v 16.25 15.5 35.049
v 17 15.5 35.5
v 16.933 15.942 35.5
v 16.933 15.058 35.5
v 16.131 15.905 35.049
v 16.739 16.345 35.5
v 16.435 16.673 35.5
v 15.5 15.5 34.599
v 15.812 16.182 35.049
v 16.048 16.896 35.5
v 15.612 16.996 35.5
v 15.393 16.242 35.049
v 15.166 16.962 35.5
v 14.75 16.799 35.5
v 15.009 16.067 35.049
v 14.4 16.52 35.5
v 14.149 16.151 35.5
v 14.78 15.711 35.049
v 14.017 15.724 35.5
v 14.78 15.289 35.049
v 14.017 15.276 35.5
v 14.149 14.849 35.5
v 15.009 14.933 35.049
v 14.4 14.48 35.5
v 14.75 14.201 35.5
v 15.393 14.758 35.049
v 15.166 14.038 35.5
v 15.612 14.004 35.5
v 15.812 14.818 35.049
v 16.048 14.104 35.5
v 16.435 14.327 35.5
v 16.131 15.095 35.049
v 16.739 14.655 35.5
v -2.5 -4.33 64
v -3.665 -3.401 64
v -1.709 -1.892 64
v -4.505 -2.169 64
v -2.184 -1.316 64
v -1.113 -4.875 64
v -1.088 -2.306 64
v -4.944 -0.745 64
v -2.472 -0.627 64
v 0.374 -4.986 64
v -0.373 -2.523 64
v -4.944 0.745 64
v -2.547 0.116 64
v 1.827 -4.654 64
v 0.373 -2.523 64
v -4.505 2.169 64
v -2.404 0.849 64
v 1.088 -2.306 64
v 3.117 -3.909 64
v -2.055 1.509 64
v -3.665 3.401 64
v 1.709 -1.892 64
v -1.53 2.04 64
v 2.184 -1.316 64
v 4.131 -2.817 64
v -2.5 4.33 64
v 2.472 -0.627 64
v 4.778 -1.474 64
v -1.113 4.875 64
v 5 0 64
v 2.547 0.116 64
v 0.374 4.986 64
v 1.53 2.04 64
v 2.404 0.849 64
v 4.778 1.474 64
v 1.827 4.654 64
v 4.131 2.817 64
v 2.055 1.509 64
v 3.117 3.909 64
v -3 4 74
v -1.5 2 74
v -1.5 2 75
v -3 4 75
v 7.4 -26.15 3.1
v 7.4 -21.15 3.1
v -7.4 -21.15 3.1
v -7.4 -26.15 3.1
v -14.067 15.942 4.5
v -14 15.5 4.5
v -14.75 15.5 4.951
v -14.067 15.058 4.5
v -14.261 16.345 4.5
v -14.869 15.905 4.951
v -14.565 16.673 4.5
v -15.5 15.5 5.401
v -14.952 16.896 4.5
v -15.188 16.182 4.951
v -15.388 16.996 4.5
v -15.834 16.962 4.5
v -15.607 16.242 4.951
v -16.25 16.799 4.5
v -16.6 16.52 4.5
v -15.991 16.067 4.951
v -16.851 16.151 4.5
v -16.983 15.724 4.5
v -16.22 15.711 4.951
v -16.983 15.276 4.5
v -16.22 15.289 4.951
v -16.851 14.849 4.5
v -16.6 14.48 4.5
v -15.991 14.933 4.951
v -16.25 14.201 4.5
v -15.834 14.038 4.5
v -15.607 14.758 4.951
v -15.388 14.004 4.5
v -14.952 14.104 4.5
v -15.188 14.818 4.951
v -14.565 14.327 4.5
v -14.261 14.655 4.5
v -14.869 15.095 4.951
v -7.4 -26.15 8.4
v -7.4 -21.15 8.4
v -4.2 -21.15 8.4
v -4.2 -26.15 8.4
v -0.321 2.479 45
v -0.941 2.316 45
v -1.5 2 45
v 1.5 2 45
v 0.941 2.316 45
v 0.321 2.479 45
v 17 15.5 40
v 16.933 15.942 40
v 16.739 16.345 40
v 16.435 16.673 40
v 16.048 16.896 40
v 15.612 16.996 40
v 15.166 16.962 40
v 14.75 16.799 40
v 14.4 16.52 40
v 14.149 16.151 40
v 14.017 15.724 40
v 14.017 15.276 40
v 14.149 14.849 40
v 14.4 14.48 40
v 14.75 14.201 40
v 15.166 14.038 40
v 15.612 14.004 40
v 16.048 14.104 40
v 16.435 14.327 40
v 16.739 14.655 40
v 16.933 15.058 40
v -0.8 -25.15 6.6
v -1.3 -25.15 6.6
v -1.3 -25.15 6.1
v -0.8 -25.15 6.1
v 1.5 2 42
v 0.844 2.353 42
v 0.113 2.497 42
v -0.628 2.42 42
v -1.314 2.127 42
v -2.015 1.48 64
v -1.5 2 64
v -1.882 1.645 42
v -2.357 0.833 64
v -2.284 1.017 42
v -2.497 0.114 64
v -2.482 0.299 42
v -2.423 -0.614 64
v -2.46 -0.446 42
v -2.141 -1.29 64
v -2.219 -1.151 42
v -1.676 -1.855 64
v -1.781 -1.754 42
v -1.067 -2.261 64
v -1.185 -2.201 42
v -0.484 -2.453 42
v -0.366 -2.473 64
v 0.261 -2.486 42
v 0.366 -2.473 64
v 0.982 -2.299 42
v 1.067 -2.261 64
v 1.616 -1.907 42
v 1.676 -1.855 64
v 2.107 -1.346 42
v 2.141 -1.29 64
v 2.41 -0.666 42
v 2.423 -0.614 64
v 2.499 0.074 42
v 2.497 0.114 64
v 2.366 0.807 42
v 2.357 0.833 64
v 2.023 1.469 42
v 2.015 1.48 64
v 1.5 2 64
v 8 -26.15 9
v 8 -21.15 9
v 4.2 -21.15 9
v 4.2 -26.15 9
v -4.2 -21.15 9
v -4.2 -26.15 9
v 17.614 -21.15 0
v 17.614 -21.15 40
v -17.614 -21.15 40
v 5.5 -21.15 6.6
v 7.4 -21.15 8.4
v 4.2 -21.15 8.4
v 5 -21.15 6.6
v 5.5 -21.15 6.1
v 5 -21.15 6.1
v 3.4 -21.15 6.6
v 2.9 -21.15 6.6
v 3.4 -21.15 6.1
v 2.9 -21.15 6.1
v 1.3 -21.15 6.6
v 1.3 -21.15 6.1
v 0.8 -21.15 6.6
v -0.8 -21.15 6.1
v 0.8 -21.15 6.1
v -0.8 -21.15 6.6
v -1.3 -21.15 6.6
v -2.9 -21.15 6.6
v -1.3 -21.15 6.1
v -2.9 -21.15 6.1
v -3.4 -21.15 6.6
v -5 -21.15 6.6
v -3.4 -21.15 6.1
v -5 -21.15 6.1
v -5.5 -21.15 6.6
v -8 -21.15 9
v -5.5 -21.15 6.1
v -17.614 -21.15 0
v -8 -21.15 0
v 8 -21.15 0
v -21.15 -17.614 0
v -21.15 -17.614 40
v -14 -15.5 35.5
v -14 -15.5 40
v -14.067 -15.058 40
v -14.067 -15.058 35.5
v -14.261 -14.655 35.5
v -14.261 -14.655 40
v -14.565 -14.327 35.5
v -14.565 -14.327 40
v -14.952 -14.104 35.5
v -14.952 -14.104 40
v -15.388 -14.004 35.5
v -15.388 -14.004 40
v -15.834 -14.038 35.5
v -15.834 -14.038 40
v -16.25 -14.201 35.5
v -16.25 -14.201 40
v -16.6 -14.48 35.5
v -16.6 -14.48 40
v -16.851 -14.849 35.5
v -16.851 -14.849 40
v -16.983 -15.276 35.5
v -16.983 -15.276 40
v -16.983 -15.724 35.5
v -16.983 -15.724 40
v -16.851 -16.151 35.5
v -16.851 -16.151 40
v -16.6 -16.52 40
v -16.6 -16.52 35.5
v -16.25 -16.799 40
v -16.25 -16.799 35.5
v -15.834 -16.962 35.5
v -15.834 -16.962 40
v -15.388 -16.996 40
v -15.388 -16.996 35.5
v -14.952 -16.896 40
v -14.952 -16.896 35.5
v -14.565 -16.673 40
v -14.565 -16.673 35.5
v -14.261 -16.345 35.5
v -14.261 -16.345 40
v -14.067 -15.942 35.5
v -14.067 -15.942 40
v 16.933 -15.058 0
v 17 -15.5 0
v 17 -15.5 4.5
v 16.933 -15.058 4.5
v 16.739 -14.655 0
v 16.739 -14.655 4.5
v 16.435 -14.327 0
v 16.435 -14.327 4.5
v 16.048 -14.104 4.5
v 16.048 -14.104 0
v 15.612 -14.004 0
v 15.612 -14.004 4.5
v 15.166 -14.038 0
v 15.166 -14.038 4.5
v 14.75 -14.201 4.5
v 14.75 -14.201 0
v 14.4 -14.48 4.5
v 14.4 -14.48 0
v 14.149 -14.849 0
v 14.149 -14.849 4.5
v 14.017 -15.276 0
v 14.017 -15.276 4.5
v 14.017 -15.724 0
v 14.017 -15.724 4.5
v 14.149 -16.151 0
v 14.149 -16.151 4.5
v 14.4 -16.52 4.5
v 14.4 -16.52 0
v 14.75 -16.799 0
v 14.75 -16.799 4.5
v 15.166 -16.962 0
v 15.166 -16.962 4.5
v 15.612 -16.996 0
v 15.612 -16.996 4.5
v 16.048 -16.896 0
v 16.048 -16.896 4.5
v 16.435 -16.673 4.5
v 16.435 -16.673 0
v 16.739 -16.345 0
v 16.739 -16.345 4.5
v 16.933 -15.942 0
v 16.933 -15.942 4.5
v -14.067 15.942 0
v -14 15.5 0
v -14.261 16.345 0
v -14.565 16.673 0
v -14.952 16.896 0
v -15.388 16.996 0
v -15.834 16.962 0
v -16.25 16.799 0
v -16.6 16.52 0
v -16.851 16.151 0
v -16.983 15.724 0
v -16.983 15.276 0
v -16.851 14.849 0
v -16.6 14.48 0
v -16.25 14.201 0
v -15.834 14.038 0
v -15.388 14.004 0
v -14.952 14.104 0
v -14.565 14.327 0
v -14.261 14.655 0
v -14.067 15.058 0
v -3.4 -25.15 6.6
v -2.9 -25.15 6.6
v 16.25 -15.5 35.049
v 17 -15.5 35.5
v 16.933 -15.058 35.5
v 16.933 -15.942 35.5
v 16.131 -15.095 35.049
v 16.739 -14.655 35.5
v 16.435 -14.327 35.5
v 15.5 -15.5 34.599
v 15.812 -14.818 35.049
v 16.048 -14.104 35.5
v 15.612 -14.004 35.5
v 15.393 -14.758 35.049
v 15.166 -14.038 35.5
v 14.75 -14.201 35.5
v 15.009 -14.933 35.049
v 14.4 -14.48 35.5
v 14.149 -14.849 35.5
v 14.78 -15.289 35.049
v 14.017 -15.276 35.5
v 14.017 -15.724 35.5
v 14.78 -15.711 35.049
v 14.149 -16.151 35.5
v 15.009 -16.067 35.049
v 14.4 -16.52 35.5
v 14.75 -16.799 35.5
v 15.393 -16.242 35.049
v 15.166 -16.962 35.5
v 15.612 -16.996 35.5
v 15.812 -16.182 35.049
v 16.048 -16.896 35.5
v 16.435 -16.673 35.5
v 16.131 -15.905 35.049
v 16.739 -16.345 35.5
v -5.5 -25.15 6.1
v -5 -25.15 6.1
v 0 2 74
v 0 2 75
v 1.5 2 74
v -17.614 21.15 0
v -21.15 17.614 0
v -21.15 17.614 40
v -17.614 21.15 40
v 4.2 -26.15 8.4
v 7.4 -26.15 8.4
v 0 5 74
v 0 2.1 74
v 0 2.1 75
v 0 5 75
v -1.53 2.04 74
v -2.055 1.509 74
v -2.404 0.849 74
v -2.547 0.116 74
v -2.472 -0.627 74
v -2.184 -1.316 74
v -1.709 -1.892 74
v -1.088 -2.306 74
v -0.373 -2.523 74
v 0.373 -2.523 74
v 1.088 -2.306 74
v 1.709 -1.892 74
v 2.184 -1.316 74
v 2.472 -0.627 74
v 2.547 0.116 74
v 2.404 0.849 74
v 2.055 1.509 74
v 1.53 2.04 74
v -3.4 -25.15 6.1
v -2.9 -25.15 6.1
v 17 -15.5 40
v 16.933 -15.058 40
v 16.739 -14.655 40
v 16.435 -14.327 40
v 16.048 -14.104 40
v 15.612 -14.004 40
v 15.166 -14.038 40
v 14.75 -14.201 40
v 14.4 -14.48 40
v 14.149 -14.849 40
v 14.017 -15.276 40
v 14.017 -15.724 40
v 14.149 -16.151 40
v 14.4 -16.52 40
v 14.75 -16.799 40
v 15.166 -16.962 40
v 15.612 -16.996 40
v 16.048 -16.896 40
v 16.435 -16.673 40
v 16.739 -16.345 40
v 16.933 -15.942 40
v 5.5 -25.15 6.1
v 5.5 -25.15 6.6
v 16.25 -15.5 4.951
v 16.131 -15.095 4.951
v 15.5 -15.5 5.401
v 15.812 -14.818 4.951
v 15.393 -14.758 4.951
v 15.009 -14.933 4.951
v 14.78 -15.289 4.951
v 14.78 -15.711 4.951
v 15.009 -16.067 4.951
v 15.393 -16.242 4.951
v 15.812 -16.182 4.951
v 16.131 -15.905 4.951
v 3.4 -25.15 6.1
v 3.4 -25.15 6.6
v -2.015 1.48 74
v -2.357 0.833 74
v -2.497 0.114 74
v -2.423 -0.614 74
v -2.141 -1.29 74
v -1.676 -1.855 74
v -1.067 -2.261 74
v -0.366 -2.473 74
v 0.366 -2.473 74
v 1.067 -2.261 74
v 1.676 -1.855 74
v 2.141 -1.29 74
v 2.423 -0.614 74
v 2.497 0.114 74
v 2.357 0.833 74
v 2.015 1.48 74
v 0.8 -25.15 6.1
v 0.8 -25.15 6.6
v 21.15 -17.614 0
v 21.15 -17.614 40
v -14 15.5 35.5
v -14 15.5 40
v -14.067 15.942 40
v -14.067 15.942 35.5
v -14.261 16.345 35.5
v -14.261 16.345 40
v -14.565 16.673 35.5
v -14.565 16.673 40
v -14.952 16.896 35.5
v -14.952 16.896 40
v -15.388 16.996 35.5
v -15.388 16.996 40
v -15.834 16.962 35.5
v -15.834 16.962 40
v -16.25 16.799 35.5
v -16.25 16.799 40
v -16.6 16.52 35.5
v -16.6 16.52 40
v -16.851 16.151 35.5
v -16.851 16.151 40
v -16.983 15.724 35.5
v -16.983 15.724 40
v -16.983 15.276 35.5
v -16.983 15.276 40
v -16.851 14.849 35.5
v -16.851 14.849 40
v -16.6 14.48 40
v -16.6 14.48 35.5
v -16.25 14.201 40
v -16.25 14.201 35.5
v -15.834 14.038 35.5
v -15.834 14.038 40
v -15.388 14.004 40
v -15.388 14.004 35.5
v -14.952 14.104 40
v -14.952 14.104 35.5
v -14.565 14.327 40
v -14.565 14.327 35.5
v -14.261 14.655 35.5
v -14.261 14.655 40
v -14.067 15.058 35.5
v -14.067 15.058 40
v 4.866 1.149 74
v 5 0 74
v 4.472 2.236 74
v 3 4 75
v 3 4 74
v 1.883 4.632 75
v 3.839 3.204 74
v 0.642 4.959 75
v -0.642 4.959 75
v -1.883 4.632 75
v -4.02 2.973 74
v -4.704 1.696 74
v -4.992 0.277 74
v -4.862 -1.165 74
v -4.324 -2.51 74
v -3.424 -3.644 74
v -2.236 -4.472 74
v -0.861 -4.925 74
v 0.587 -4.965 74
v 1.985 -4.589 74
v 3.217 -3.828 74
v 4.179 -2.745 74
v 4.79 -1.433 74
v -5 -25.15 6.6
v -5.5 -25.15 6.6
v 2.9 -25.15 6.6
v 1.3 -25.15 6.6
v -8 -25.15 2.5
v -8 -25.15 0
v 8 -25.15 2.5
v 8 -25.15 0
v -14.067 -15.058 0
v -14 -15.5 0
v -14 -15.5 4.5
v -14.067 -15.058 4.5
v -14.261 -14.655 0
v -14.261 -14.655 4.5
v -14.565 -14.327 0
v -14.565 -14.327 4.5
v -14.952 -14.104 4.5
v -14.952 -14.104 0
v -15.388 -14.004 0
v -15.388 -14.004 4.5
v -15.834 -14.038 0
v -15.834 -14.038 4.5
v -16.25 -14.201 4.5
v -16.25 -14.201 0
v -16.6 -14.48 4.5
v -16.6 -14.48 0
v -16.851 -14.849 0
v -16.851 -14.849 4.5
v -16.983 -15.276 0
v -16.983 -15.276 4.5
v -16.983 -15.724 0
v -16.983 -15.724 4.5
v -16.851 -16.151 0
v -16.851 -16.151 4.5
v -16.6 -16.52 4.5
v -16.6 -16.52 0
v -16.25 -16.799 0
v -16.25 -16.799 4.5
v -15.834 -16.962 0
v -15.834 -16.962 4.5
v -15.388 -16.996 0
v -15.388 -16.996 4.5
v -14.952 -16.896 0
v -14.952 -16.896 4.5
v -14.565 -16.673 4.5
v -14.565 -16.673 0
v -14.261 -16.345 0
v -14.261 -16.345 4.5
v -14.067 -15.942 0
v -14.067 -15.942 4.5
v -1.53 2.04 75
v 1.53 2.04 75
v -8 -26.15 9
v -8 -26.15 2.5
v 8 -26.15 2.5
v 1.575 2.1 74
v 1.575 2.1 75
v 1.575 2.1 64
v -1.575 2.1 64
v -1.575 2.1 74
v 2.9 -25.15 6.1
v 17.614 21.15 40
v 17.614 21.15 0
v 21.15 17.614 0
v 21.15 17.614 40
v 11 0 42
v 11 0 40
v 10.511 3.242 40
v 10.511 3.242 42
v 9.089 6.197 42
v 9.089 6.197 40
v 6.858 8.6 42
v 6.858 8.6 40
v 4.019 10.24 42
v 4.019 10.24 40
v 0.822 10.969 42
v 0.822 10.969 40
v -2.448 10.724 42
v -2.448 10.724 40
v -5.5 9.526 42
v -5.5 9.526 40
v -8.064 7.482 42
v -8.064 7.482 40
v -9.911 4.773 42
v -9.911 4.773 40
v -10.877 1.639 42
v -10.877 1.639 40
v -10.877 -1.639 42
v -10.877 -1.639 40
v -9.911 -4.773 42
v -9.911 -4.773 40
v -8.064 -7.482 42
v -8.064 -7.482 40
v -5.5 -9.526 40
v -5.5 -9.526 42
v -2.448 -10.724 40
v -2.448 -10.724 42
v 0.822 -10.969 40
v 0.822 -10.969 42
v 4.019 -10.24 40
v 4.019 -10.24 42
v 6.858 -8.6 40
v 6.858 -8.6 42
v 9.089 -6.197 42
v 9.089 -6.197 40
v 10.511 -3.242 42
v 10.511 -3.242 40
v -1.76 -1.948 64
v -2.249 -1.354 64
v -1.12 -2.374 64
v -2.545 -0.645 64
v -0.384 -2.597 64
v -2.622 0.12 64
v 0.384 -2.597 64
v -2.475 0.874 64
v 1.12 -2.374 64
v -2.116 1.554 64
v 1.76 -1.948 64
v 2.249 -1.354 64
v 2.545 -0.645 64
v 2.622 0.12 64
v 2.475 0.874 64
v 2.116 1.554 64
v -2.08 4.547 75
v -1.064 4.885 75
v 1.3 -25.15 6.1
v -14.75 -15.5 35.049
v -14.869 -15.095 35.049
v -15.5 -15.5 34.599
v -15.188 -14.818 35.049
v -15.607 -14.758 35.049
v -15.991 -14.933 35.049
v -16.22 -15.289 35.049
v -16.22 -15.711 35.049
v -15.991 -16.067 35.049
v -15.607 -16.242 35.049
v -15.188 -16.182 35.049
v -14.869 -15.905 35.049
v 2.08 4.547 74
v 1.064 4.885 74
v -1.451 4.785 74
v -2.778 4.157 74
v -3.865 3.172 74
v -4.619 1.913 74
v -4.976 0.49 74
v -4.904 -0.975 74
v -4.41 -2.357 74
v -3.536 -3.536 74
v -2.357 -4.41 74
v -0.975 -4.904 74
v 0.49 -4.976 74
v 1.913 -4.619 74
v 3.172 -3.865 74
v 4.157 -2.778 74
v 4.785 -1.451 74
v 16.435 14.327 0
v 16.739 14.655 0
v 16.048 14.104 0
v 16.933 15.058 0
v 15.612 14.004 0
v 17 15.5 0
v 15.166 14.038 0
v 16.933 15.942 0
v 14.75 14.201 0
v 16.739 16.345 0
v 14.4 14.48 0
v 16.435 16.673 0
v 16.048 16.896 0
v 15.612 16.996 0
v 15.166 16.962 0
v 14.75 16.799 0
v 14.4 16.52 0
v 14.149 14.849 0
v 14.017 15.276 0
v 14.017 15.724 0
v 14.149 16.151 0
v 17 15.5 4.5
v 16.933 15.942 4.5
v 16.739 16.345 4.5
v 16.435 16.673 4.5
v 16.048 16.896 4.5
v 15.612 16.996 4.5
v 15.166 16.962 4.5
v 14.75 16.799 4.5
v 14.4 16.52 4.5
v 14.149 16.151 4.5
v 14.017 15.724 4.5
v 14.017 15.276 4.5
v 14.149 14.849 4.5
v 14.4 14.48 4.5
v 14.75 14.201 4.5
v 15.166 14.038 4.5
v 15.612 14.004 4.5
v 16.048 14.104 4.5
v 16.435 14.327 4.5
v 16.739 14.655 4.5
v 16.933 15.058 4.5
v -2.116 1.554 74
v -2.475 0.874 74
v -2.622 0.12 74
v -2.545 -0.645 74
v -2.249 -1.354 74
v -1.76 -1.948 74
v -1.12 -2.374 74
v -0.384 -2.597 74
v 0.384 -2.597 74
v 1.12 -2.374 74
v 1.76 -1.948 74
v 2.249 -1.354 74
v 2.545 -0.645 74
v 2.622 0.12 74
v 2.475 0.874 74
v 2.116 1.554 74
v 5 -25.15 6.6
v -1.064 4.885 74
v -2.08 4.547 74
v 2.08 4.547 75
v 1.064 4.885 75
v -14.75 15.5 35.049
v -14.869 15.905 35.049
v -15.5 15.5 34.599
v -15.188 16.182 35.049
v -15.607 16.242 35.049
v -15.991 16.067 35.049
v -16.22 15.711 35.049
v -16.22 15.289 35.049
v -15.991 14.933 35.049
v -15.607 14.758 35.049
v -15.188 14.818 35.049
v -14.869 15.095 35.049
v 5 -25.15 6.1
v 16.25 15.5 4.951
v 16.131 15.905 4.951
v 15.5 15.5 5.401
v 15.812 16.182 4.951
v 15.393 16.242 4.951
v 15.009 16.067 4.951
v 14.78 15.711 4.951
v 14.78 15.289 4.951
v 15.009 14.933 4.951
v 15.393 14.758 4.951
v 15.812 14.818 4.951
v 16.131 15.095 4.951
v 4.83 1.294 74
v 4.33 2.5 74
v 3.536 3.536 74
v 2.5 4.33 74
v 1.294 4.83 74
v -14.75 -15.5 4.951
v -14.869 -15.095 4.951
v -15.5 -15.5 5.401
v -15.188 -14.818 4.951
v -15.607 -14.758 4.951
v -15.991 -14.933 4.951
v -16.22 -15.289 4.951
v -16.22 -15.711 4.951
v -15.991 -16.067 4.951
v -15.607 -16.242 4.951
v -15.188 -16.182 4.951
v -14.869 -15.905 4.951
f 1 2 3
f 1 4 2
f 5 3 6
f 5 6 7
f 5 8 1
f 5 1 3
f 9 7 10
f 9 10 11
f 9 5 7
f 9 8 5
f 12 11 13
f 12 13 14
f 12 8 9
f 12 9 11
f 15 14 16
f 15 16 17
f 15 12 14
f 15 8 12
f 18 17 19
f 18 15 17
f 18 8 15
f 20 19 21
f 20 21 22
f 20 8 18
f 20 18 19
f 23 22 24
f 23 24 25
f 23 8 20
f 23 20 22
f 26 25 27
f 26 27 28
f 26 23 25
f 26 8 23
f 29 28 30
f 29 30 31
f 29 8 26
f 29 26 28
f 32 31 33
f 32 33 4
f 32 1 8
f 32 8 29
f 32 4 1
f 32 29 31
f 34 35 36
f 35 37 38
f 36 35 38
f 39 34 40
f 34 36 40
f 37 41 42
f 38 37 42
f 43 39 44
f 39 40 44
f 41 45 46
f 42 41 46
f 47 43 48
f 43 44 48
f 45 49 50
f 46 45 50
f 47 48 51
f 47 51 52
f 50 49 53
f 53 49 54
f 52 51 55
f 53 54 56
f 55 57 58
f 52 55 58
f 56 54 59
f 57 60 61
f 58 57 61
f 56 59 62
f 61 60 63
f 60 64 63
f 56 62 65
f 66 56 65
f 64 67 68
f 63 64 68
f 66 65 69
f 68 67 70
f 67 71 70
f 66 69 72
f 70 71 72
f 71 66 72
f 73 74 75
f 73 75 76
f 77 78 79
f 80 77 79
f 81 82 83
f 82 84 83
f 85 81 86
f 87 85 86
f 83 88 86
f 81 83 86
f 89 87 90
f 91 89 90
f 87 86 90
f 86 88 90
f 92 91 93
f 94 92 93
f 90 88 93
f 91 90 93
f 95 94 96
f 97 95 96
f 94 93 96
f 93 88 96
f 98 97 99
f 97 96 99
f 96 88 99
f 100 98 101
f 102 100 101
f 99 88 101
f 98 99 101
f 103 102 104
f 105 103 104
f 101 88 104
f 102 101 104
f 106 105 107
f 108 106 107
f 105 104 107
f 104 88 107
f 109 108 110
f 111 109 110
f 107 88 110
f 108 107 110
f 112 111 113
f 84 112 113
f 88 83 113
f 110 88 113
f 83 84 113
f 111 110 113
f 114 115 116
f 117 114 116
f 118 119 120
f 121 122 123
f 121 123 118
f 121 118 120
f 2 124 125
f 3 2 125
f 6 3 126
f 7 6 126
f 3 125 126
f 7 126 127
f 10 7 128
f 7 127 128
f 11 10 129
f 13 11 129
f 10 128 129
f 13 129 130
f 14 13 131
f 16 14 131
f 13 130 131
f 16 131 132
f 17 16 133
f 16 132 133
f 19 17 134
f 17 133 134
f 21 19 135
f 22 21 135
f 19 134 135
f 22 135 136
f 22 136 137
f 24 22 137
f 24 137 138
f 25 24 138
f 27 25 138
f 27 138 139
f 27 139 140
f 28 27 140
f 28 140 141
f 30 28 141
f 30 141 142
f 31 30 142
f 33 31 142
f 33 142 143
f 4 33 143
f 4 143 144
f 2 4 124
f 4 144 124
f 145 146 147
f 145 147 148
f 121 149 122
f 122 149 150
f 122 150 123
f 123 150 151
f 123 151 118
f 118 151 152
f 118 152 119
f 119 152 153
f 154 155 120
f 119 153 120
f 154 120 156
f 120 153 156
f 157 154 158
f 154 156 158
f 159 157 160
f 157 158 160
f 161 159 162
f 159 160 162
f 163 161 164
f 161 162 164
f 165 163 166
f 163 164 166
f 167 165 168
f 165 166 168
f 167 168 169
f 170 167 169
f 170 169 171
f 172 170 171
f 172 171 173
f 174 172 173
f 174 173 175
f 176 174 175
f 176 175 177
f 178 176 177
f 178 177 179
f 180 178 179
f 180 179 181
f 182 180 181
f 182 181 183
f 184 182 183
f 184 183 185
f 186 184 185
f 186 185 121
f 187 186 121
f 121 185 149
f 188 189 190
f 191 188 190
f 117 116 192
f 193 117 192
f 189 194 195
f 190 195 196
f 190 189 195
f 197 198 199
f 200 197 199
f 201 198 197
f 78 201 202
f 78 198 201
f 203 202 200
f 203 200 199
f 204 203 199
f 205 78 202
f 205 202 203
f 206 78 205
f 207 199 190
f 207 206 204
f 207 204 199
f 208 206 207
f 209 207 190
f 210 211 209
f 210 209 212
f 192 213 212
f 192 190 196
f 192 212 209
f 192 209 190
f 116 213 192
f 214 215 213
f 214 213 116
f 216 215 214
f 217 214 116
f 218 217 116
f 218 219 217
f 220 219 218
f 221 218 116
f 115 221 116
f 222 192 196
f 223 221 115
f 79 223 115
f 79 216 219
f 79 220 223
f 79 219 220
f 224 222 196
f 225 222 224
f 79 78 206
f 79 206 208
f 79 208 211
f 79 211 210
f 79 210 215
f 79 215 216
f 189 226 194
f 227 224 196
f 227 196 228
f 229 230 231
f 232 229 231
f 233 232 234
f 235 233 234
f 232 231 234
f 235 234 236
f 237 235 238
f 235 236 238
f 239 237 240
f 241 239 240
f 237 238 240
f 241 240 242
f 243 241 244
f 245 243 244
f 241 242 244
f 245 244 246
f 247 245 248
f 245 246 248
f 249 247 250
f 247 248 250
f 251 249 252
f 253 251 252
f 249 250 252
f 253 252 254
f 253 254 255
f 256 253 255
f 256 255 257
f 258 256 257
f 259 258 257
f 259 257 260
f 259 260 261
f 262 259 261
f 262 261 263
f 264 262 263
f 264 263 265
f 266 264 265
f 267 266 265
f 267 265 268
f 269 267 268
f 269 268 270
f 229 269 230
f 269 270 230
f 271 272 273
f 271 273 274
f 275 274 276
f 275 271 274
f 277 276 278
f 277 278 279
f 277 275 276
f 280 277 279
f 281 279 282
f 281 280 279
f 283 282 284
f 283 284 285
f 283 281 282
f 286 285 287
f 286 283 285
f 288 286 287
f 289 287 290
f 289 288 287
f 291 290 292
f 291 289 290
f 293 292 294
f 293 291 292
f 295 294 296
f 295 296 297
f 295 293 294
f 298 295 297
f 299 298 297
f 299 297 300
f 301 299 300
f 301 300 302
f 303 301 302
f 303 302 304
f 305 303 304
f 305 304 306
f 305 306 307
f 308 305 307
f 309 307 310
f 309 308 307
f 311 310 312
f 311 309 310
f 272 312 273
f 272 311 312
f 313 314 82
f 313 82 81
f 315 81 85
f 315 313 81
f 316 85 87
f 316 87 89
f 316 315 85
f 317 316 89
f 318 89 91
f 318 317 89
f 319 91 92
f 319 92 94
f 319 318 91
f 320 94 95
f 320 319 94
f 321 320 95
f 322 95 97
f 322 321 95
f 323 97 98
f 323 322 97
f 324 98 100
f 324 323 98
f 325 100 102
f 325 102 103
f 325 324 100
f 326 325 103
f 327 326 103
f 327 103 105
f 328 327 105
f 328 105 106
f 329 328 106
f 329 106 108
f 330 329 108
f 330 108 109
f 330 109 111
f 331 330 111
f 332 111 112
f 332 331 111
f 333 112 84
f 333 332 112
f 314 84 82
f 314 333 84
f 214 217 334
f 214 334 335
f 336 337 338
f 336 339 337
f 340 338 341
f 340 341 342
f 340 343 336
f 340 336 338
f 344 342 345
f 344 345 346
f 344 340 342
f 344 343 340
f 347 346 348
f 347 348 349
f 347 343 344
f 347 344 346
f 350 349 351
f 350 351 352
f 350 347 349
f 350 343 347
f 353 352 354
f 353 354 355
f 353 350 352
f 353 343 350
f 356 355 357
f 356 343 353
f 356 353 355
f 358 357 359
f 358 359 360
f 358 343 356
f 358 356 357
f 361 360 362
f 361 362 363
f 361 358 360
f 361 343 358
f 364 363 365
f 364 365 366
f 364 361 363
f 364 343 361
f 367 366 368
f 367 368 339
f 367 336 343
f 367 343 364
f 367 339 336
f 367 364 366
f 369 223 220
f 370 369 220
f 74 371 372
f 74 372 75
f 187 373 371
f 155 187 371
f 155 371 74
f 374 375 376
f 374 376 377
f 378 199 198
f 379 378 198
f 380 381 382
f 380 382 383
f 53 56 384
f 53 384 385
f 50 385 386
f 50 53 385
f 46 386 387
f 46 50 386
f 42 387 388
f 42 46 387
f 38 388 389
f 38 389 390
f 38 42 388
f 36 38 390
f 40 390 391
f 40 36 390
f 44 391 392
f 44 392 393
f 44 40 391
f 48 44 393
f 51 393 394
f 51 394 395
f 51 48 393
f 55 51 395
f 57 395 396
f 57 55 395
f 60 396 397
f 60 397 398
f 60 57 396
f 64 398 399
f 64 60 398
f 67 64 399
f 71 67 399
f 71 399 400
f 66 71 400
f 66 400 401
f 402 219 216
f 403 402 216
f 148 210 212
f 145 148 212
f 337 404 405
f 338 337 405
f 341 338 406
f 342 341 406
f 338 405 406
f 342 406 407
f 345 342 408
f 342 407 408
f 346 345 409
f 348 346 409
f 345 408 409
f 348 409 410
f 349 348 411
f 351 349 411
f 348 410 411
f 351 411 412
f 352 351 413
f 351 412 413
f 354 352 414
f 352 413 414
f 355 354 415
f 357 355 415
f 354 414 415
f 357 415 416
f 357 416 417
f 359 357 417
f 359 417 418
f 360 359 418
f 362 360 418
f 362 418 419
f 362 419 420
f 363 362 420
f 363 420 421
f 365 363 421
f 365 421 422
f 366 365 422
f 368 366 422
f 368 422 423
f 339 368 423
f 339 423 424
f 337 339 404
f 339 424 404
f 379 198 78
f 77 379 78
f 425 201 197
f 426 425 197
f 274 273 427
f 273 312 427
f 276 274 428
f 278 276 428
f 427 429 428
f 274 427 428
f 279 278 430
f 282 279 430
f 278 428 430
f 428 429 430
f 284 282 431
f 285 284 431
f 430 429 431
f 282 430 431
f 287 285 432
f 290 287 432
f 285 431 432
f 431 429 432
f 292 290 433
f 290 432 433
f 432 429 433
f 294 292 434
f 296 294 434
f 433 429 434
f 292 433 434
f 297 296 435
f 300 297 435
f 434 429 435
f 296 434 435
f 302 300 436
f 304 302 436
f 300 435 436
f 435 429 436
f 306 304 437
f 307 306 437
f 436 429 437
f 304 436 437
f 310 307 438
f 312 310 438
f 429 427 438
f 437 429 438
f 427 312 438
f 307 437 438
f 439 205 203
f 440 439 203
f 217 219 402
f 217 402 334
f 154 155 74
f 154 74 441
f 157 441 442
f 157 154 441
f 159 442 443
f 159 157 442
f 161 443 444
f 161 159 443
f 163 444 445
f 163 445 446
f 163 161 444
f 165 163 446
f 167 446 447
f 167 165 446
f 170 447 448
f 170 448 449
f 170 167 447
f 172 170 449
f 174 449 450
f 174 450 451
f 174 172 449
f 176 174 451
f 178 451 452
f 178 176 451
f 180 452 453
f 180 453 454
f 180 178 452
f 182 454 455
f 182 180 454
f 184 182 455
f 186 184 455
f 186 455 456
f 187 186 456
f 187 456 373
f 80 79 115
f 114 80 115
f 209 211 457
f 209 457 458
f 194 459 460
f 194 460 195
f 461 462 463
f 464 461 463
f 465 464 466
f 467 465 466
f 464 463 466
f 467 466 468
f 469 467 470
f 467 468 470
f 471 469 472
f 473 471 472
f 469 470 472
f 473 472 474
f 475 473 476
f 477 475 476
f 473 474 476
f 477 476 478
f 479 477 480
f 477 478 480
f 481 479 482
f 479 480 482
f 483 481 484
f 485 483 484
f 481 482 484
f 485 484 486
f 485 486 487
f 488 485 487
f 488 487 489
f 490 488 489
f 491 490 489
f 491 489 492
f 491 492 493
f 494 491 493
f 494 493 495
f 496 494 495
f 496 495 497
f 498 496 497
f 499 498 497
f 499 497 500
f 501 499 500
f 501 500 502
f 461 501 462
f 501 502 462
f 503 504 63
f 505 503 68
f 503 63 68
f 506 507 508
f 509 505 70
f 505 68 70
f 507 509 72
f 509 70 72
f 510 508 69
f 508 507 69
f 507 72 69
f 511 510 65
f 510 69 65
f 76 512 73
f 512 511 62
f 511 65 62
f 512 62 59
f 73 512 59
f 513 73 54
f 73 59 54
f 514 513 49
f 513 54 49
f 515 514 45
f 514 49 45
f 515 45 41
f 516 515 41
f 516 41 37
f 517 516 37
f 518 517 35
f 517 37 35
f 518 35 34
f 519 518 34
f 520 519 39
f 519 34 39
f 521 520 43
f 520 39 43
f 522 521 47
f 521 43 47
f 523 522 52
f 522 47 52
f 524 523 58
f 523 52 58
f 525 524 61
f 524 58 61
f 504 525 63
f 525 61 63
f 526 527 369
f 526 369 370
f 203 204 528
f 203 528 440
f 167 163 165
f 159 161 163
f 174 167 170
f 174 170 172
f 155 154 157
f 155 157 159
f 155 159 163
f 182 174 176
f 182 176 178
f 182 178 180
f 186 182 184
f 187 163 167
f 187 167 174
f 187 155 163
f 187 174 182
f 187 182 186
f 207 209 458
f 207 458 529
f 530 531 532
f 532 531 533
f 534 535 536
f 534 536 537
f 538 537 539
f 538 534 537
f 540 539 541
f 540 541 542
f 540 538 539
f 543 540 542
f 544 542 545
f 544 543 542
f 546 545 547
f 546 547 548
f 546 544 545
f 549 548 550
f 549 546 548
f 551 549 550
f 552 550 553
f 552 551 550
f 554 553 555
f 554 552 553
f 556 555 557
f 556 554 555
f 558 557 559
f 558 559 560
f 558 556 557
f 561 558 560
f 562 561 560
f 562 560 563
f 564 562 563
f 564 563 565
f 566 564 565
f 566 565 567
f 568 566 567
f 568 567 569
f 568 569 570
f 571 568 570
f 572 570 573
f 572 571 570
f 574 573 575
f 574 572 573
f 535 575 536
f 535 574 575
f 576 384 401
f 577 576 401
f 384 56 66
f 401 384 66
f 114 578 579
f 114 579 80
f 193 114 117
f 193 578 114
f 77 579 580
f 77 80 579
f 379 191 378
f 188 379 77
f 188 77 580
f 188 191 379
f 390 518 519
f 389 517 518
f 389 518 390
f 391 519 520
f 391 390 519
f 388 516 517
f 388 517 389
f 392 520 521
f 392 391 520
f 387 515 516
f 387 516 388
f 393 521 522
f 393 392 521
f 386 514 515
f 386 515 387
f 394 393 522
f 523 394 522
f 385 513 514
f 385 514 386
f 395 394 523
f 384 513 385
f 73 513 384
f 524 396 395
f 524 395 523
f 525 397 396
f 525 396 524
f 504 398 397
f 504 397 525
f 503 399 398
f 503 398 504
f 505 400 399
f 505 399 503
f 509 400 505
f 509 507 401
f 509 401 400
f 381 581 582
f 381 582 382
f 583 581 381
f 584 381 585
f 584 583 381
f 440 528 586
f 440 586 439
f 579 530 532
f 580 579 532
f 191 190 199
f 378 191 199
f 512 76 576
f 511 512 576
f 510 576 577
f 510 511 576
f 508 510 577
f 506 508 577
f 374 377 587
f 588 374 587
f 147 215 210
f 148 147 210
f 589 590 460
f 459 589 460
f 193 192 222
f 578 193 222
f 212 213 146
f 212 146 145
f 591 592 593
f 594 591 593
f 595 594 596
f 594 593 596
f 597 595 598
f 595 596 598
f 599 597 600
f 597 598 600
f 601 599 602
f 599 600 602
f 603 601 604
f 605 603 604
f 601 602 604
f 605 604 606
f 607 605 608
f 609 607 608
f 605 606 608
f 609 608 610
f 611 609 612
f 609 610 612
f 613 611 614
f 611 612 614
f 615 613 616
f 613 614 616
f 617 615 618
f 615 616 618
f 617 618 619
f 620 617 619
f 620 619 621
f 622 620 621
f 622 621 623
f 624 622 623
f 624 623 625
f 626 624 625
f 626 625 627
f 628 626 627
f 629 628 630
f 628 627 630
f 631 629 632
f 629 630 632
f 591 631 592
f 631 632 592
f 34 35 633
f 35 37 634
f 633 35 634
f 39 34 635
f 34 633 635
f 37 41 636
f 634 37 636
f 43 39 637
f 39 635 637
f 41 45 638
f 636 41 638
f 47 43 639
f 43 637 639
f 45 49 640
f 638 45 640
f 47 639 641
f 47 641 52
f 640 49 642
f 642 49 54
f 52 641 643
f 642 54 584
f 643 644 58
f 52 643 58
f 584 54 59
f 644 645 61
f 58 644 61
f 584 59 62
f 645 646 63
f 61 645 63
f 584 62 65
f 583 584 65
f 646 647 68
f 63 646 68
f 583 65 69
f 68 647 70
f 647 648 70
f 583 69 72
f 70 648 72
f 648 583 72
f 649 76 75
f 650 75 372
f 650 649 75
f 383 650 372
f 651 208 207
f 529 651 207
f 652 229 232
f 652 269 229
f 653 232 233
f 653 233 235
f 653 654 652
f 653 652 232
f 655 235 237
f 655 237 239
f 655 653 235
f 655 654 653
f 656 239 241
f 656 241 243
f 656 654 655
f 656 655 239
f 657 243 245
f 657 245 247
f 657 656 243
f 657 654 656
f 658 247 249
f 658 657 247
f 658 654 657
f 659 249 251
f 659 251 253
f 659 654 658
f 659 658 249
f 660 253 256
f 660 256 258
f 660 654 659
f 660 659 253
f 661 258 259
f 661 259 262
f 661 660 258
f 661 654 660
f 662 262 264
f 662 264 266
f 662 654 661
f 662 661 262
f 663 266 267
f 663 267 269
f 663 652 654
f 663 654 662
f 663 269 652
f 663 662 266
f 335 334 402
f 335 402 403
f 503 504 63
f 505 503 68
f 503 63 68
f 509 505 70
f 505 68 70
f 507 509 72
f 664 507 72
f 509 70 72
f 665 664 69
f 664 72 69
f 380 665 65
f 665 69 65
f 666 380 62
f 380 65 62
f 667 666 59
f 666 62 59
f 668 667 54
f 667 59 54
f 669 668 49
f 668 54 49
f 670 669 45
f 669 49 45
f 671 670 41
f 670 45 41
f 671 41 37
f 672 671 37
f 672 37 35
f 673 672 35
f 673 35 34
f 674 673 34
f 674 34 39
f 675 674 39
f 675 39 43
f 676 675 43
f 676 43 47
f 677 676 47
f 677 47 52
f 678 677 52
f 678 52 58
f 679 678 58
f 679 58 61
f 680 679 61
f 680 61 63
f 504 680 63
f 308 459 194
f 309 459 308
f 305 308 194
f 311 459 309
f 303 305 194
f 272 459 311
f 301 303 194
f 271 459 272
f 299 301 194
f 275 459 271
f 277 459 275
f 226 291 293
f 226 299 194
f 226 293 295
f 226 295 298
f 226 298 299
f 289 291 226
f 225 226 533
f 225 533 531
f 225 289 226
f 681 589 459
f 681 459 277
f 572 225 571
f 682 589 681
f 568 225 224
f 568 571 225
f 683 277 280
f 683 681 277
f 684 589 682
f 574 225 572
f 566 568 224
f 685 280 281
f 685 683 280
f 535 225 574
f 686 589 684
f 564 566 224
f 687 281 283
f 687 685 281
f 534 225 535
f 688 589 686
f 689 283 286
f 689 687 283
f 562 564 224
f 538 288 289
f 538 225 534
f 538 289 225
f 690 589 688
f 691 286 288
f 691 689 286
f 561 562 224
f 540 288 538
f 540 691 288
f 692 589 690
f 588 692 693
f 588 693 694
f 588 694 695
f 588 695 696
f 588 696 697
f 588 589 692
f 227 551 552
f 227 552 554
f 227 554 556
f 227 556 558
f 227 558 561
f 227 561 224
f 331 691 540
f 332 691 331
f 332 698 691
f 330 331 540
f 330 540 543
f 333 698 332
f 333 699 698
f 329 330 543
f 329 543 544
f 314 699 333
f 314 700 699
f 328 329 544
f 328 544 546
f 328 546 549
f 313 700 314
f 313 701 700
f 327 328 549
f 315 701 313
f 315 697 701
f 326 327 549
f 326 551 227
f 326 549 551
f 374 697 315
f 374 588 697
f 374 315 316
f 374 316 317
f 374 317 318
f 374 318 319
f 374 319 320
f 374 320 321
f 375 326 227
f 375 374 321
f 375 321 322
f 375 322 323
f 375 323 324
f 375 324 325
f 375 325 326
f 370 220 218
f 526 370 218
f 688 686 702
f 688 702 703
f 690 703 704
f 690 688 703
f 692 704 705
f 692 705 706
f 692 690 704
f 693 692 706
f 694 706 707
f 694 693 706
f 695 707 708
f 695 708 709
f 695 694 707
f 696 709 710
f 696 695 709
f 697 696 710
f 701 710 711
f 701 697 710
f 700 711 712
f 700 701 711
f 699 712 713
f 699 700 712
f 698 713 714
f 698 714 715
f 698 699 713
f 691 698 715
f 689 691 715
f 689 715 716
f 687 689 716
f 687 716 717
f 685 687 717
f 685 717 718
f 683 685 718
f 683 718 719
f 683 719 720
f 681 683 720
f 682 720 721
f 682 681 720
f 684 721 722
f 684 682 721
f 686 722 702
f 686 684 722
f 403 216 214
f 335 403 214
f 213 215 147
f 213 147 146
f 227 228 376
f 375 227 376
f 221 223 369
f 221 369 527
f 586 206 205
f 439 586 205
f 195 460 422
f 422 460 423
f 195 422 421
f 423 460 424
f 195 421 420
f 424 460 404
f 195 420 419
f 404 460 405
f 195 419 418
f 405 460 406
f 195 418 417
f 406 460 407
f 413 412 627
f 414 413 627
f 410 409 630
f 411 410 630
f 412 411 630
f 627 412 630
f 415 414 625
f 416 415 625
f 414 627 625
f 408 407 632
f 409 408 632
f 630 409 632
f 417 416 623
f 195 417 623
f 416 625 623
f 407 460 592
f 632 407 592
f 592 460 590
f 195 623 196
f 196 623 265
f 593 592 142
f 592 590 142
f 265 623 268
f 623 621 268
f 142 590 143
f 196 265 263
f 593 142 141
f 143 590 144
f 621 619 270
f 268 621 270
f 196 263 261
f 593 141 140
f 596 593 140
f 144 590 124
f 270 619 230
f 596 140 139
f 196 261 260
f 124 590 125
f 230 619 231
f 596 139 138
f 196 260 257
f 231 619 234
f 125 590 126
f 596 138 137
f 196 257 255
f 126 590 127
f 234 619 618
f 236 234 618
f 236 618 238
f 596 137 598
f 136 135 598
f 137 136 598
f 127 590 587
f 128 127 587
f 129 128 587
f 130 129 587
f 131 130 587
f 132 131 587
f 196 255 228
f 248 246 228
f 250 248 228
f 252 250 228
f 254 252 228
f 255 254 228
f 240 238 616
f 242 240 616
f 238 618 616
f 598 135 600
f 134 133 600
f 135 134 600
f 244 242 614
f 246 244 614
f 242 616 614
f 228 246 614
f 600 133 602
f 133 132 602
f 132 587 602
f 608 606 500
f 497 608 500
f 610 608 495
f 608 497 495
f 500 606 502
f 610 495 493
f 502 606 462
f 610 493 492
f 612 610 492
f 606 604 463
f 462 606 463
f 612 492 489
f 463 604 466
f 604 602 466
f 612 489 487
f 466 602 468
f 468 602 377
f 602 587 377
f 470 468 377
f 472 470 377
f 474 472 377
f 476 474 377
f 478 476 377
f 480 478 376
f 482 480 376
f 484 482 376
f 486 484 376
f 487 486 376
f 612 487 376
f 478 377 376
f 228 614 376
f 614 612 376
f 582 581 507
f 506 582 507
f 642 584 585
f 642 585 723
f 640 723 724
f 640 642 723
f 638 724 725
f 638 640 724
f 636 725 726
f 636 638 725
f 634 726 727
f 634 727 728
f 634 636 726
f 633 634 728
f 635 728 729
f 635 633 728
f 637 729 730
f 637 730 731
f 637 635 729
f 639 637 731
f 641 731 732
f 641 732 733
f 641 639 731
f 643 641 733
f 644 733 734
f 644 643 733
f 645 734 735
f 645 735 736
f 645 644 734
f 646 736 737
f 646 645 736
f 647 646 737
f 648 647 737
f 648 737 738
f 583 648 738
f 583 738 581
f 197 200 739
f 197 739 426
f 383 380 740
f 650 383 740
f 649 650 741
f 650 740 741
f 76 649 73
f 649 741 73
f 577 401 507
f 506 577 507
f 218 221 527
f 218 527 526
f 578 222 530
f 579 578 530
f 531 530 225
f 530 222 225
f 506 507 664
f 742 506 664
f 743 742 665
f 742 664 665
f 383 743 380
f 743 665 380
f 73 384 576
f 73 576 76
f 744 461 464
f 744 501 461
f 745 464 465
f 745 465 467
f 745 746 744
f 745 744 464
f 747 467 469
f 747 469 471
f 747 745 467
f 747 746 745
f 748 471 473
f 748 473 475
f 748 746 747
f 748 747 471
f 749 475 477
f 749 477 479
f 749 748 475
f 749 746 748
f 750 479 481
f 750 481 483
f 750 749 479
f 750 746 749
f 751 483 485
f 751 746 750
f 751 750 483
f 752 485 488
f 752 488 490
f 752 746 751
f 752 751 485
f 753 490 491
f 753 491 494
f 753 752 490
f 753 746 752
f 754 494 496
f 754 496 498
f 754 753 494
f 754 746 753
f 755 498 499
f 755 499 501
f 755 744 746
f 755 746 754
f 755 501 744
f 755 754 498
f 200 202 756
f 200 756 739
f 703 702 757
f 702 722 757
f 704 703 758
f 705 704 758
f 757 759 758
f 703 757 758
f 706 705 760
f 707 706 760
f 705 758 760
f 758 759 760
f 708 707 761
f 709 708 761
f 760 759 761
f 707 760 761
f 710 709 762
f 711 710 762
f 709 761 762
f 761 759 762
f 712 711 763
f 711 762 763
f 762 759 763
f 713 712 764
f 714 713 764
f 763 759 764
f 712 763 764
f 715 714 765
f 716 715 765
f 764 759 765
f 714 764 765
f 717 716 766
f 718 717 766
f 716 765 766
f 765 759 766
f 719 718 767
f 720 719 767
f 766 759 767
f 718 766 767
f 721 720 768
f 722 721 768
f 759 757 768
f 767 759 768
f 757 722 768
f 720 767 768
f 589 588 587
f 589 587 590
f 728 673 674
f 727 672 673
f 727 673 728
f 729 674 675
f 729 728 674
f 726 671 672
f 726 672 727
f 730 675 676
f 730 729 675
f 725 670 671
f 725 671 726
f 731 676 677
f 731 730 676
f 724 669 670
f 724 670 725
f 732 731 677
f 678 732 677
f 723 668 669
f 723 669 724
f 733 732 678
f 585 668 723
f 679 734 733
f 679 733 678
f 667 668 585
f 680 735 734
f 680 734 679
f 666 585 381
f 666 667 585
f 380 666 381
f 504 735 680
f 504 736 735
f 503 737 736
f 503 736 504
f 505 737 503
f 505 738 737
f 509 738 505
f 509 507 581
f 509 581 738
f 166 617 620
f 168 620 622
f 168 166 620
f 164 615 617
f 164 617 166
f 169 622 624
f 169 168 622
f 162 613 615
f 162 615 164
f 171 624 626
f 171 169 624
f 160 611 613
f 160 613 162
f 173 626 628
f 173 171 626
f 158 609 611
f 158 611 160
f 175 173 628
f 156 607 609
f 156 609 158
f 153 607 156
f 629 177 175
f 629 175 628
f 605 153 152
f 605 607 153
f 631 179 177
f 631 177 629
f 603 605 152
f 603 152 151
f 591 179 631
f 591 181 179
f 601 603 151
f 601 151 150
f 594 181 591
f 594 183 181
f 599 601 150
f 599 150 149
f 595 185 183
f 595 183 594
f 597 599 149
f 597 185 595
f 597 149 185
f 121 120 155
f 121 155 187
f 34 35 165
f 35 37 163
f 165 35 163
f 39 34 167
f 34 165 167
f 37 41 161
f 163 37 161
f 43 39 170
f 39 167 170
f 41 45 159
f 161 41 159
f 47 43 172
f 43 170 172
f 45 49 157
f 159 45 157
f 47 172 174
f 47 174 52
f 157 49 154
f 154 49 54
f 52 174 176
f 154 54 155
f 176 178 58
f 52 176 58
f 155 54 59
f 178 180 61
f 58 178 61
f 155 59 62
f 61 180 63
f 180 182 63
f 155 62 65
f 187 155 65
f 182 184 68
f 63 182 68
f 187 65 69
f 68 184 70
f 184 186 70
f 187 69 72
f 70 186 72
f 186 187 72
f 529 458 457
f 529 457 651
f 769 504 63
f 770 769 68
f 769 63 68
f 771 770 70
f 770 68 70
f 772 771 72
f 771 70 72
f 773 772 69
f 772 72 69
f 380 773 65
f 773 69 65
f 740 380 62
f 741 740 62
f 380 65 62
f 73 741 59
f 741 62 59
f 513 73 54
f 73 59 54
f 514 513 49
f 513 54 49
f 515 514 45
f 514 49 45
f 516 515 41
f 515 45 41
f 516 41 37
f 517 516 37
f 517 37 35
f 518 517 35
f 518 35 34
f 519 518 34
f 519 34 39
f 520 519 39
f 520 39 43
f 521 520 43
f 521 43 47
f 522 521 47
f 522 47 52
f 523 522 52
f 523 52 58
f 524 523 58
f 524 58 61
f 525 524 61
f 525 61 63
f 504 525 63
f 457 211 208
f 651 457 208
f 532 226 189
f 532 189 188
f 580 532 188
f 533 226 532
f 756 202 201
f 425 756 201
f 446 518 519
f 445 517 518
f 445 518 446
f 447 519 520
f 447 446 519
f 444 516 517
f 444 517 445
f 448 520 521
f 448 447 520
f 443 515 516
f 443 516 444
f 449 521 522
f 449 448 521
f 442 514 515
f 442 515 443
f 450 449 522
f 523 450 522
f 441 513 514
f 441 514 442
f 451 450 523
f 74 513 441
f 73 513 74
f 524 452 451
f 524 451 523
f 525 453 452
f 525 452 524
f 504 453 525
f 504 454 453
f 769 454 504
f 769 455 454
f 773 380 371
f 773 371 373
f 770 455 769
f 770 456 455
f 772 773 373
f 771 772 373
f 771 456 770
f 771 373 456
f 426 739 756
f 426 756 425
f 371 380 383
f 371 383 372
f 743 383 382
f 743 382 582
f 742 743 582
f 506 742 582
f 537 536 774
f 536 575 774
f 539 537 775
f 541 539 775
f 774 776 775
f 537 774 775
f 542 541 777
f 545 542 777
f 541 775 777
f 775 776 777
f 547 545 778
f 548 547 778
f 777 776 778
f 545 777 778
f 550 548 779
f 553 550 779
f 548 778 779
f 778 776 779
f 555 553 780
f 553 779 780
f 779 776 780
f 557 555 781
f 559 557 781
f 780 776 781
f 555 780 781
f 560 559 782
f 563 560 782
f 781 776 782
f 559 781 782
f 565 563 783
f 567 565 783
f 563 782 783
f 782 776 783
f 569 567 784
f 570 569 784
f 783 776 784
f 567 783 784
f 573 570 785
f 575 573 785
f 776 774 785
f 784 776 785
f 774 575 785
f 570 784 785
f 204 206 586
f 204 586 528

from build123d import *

# Parameters (mm, degrees)
PAD_DEPTH      = 40
SKETCH001_R    = 1.5
HOLE_DEPTH     = 4.5
HOLE_TIPS_R    = 1.5
SKETCH002_R    = 1.5
HOLE001_DEPTH  = 4.5
HOLE001_TIPS_R = 1.5
SKETCH003_R    = 11
PAD001_DEPTH   = 2
PAD002_DEPTH   = 22
SKETCH005_R    = 2.5
PAD003_DEPTH   = 3
SKETCH006_W    = 16
SKETCH006_H    = 4
PAD004_DEPTH   = 2.5
PAD005_DEPTH   = 5
SKETCH008_W    = 0.5
SKETCH008_H    = 0.5
PAD006_DEPTH   = 4
SKETCH009_R    = 5
PAD007_DEPTH   = 10
PAD011_DEPTH   = 1
SKETCH010_R    = 5
PAD008_DEPTH   = 10
PAD012_DEPTH   = 1
SKETCH011_R    = 5
PAD009_DEPTH   = 10
PAD010_DEPTH   = 1


with BuildPart() as motor:
    # Sketch → Pad (new body)
    with BuildSketch(Plane.XY):
        Polygon((-17.614466, 21.15), (17.614466, 21.15), (21.15, 17.614466), (21.15, -17.614466), (17.614466, -21.15), (-17.614466, -21.15), (-21.15, -17.614466), (-21.15, 17.614466), align=None)
    extrude(amount=PAD_DEPTH)

    # Sketch001 (on Face10 of Pad) → Hole (cut)
    with BuildSketch(Plane.XY.offset(40)):
        with Locations((15.5, 15.5)):
            Circle(SKETCH001_R)
        with Locations((-15.5, 15.5)):
            Circle(SKETCH001_R)
        with Locations((-15.5, -15.5)):
            Circle(SKETCH001_R)
        with Locations((15.5, -15.5)):
            Circle(SKETCH001_R)
    extrude(amount=-HOLE_DEPTH, mode=Mode.SUBTRACT)

    # Hole tips → Hole tip 1 section 0
    with BuildSketch(Plane.XY.offset(35.5), mode=Mode.PRIVATE) as hole_tip_1_s0:
        with Locations((15.5, 15.5)):
            Circle(HOLE_TIPS_R)
    loft([hole_tip_1_s0.sketch, Vertex(15.5, 15.5, 34.598709)], mode=Mode.SUBTRACT)

    # Hole tips → Hole tip 2 section 0
    with BuildSketch(Plane.XY.offset(35.5), mode=Mode.PRIVATE) as hole_tip_2_s0:
        with Locations((-15.5, 15.5)):
            Circle(HOLE_TIPS_R)
    loft([hole_tip_2_s0.sketch, Vertex(-15.5, 15.5, 34.598709)], mode=Mode.SUBTRACT)

    # Hole tips → Hole tip 3 section 0
    with BuildSketch(Plane.XY.offset(35.5), mode=Mode.PRIVATE) as hole_tip_3_s0:
        with Locations((-15.5, -15.5)):
            Circle(HOLE_TIPS_R)
    loft([hole_tip_3_s0.sketch, Vertex(-15.5, -15.5, 34.598709)], mode=Mode.SUBTRACT)

    # Hole tips → Hole tip 4 section 0
    with BuildSketch(Plane.XY.offset(35.5), mode=Mode.PRIVATE) as hole_tip_4_s0:
        with Locations((15.5, -15.5)):
            Circle(HOLE_TIPS_R)
    loft([hole_tip_4_s0.sketch, Vertex(15.5, -15.5, 34.598709)], mode=Mode.SUBTRACT)

    # Sketch002 → Hole001 (cut)
    with BuildSketch(Plane.XY):
        with Locations((-15.5, 15.5)):
            Circle(SKETCH002_R)
        with Locations((-15.5, -15.5)):
            Circle(SKETCH002_R)
        with Locations((15.5, -15.5)):
            Circle(SKETCH002_R)
        with Locations((15.5, 15.5)):
            Circle(SKETCH002_R)
    extrude(amount=HOLE001_DEPTH, mode=Mode.SUBTRACT)

    # Hole001 tips → Hole001 tip 1 section 0
    with BuildSketch(Plane.XY.offset(4.5), mode=Mode.PRIVATE) as hole001_tip_1_s0:
        with Locations((-15.5, 15.5)):
            Circle(HOLE001_TIPS_R)
    loft([hole001_tip_1_s0.sketch, Vertex(-15.5, 15.5, 5.401291)], mode=Mode.SUBTRACT)

    # Hole001 tips → Hole001 tip 2 section 0
    with BuildSketch(Plane.XY.offset(4.5), mode=Mode.PRIVATE) as hole001_tip_2_s0:
        with Locations((-15.5, -15.5)):
            Circle(HOLE001_TIPS_R)
    loft([hole001_tip_2_s0.sketch, Vertex(-15.5, -15.5, 5.401291)], mode=Mode.SUBTRACT)

    # Hole001 tips → Hole001 tip 3 section 0
    with BuildSketch(Plane.XY.offset(4.5), mode=Mode.PRIVATE) as hole001_tip_3_s0:
        with Locations((15.5, -15.5)):
            Circle(HOLE001_TIPS_R)
    loft([hole001_tip_3_s0.sketch, Vertex(15.5, -15.5, 5.401291)], mode=Mode.SUBTRACT)

    # Hole001 tips → Hole001 tip 4 section 0
    with BuildSketch(Plane.XY.offset(4.5), mode=Mode.PRIVATE) as hole001_tip_4_s0:
        with Locations((15.5, 15.5)):
            Circle(HOLE001_TIPS_R)
    loft([hole001_tip_4_s0.sketch, Vertex(15.5, 15.5, 5.401291)], mode=Mode.SUBTRACT)

    # Sketch003 (on Face5 of Hole001) → Pad001 (join)
    with BuildSketch(Plane.XY.offset(40)):
        Circle(SKETCH003_R)
    extrude(amount=PAD001_DEPTH)

    # Sketch004 (on Face27 of Pad001) → Pad002 (join)
    with BuildSketch(Plane.XY.offset(42)):
        with BuildLine():
            ThreePointArc((-1.5, 2), (0, -2.5), (1.5, 2))
            Line((-1.5, 2), (1.5, 2))
        make_face()
    extrude(amount=PAD002_DEPTH)

    # Sketch005 (on Face27 of Pad001) → Pad003 (join)
    with BuildSketch(Plane.XY.offset(42)):
        Circle(SKETCH005_R)
    extrude(amount=PAD003_DEPTH)

    # Sketch006 (on Face4 of Pad003) → Pad004 (join)
    with BuildSketch(Plane(origin=(0, 0, 0), x_dir=(1, 0, 0), z_dir=(0, 0, -1))):
        with Locations((0, 23.15)):
            Rectangle(SKETCH006_W, SKETCH006_H)
    extrude(amount=-PAD004_DEPTH)

    # Sketch007 (on Face10 of Pad004) → Pad005 (join)
    with BuildSketch(Plane.XZ.offset(21.15)):
        Polygon((-4.2, 9), (-8, 9), (-8, 2.5), (8, 2.5), (8, 9), (4.2, 9), (4.2, 8.4), (7.4, 8.4), (7.4, 3.1), (-7.4, 3.1), (-7.4, 8.4), (-4.2, 8.4), align=None)
    extrude(amount=PAD005_DEPTH)

    # Sketch008 (on Face10 of Pad005) → Pad006 (join)
    with BuildSketch(Plane.XZ.offset(21.15)):
        with Locations((-5.25, 6.35)):
            Rectangle(SKETCH008_W, SKETCH008_H)
        with Locations((-3.15, 6.35)):
            Rectangle(SKETCH008_W, SKETCH008_H)
        with Locations((-1.05, 6.35)):
            Rectangle(SKETCH008_W, SKETCH008_H)
        with Locations((1.05, 6.35)):
            Rectangle(SKETCH008_W, SKETCH008_H)
        with Locations((3.15, 6.35)):
            Rectangle(SKETCH008_W, SKETCH008_H)
        with Locations((5.25, 6.35)):
            Rectangle(SKETCH008_W, SKETCH008_H)
    extrude(amount=PAD006_DEPTH)


with BuildPart() as fitting_5_25mm:
    # Sketch009 (on Face1 of Binder) → Pad007 (new body)
    with BuildSketch(Plane.XY.offset(64)):
        Circle(SKETCH009_R)
        with BuildLine():
            ThreePointArc((-1.575, 2.1), (0, -2.625), (1.575, 2.1))
            Line((-1.575, 2.1), (1.575, 2.1))
        make_face(mode=Mode.SUBTRACT)
    extrude(amount=PAD007_DEPTH)

    # Sketch013 (on Face5 of Pad007) → Pad011 (join)
    with BuildSketch(Plane.XY.offset(74)):
        with BuildLine():
            ThreePointArc((3, 4), (1.581139, 4.743416), (0, 5))
            Line((0, 2.1), (0, 5))
            Line((1.575, 2.1), (0, 2.1))
            Line((1.575, 2.1), (3, 4))
        make_face()
    extrude(amount=PAD011_DEPTH)


with BuildPart() as fitting_5_1mm:
    # Sketch010 (on Face1 of Binder001) → Pad008 (new body)
    with BuildSketch(Plane.XY.offset(64)):
        Circle(SKETCH010_R)
        with BuildLine():
            ThreePointArc((-1.53, 2.04), (0, -2.55), (1.53, 2.04))
            Line((-1.53, 2.04), (1.53, 2.04))
        make_face(mode=Mode.SUBTRACT)
    extrude(amount=PAD008_DEPTH)

    # Sketch014 (on Face5 of Pad008) → Pad012 (join)
    with BuildSketch(Plane.XY.offset(74)):
        with BuildLine():
            ThreePointArc((3, 4), (0, 5), (-3, 4))
            Line((-1.53, 2.04), (-3, 4))
            Line((-1.53, 2.04), (1.53, 2.04))
            Line((1.53, 2.04), (3, 4))
        make_face()
    extrude(amount=PAD012_DEPTH)


with BuildPart() as fitting_5_0mm:
    # Sketch011 (on Face1 of Binder002) → Pad009 (new body)
    with BuildSketch(Plane.XY.offset(64)):
        Circle(SKETCH011_R)
        with BuildLine():
            ThreePointArc((-1.5, 2), (0, -2.5), (1.5, 2))
            Line((-1.5, 2), (1.5, 2))
        make_face(mode=Mode.SUBTRACT)
    extrude(amount=PAD009_DEPTH)

    # Sketch012 (on Face5 of Pad009) → Pad010 (join)
    with BuildSketch(Plane.XY.offset(74)):
        with BuildLine():
            ThreePointArc((0, 5), (-1.581139, 4.743416), (-3, 4))
            Line((-1.5, 2), (-3, 4))
            Line((0, 2), (-1.5, 2))
            Line((0, 5), (0, 2))
        make_face()
    extrude(amount=PAD010_DEPTH)


solid = Compound([motor.part, fitting_5_25mm.part, fitting_5_1mm.part, fitting_5_0mm.part])
